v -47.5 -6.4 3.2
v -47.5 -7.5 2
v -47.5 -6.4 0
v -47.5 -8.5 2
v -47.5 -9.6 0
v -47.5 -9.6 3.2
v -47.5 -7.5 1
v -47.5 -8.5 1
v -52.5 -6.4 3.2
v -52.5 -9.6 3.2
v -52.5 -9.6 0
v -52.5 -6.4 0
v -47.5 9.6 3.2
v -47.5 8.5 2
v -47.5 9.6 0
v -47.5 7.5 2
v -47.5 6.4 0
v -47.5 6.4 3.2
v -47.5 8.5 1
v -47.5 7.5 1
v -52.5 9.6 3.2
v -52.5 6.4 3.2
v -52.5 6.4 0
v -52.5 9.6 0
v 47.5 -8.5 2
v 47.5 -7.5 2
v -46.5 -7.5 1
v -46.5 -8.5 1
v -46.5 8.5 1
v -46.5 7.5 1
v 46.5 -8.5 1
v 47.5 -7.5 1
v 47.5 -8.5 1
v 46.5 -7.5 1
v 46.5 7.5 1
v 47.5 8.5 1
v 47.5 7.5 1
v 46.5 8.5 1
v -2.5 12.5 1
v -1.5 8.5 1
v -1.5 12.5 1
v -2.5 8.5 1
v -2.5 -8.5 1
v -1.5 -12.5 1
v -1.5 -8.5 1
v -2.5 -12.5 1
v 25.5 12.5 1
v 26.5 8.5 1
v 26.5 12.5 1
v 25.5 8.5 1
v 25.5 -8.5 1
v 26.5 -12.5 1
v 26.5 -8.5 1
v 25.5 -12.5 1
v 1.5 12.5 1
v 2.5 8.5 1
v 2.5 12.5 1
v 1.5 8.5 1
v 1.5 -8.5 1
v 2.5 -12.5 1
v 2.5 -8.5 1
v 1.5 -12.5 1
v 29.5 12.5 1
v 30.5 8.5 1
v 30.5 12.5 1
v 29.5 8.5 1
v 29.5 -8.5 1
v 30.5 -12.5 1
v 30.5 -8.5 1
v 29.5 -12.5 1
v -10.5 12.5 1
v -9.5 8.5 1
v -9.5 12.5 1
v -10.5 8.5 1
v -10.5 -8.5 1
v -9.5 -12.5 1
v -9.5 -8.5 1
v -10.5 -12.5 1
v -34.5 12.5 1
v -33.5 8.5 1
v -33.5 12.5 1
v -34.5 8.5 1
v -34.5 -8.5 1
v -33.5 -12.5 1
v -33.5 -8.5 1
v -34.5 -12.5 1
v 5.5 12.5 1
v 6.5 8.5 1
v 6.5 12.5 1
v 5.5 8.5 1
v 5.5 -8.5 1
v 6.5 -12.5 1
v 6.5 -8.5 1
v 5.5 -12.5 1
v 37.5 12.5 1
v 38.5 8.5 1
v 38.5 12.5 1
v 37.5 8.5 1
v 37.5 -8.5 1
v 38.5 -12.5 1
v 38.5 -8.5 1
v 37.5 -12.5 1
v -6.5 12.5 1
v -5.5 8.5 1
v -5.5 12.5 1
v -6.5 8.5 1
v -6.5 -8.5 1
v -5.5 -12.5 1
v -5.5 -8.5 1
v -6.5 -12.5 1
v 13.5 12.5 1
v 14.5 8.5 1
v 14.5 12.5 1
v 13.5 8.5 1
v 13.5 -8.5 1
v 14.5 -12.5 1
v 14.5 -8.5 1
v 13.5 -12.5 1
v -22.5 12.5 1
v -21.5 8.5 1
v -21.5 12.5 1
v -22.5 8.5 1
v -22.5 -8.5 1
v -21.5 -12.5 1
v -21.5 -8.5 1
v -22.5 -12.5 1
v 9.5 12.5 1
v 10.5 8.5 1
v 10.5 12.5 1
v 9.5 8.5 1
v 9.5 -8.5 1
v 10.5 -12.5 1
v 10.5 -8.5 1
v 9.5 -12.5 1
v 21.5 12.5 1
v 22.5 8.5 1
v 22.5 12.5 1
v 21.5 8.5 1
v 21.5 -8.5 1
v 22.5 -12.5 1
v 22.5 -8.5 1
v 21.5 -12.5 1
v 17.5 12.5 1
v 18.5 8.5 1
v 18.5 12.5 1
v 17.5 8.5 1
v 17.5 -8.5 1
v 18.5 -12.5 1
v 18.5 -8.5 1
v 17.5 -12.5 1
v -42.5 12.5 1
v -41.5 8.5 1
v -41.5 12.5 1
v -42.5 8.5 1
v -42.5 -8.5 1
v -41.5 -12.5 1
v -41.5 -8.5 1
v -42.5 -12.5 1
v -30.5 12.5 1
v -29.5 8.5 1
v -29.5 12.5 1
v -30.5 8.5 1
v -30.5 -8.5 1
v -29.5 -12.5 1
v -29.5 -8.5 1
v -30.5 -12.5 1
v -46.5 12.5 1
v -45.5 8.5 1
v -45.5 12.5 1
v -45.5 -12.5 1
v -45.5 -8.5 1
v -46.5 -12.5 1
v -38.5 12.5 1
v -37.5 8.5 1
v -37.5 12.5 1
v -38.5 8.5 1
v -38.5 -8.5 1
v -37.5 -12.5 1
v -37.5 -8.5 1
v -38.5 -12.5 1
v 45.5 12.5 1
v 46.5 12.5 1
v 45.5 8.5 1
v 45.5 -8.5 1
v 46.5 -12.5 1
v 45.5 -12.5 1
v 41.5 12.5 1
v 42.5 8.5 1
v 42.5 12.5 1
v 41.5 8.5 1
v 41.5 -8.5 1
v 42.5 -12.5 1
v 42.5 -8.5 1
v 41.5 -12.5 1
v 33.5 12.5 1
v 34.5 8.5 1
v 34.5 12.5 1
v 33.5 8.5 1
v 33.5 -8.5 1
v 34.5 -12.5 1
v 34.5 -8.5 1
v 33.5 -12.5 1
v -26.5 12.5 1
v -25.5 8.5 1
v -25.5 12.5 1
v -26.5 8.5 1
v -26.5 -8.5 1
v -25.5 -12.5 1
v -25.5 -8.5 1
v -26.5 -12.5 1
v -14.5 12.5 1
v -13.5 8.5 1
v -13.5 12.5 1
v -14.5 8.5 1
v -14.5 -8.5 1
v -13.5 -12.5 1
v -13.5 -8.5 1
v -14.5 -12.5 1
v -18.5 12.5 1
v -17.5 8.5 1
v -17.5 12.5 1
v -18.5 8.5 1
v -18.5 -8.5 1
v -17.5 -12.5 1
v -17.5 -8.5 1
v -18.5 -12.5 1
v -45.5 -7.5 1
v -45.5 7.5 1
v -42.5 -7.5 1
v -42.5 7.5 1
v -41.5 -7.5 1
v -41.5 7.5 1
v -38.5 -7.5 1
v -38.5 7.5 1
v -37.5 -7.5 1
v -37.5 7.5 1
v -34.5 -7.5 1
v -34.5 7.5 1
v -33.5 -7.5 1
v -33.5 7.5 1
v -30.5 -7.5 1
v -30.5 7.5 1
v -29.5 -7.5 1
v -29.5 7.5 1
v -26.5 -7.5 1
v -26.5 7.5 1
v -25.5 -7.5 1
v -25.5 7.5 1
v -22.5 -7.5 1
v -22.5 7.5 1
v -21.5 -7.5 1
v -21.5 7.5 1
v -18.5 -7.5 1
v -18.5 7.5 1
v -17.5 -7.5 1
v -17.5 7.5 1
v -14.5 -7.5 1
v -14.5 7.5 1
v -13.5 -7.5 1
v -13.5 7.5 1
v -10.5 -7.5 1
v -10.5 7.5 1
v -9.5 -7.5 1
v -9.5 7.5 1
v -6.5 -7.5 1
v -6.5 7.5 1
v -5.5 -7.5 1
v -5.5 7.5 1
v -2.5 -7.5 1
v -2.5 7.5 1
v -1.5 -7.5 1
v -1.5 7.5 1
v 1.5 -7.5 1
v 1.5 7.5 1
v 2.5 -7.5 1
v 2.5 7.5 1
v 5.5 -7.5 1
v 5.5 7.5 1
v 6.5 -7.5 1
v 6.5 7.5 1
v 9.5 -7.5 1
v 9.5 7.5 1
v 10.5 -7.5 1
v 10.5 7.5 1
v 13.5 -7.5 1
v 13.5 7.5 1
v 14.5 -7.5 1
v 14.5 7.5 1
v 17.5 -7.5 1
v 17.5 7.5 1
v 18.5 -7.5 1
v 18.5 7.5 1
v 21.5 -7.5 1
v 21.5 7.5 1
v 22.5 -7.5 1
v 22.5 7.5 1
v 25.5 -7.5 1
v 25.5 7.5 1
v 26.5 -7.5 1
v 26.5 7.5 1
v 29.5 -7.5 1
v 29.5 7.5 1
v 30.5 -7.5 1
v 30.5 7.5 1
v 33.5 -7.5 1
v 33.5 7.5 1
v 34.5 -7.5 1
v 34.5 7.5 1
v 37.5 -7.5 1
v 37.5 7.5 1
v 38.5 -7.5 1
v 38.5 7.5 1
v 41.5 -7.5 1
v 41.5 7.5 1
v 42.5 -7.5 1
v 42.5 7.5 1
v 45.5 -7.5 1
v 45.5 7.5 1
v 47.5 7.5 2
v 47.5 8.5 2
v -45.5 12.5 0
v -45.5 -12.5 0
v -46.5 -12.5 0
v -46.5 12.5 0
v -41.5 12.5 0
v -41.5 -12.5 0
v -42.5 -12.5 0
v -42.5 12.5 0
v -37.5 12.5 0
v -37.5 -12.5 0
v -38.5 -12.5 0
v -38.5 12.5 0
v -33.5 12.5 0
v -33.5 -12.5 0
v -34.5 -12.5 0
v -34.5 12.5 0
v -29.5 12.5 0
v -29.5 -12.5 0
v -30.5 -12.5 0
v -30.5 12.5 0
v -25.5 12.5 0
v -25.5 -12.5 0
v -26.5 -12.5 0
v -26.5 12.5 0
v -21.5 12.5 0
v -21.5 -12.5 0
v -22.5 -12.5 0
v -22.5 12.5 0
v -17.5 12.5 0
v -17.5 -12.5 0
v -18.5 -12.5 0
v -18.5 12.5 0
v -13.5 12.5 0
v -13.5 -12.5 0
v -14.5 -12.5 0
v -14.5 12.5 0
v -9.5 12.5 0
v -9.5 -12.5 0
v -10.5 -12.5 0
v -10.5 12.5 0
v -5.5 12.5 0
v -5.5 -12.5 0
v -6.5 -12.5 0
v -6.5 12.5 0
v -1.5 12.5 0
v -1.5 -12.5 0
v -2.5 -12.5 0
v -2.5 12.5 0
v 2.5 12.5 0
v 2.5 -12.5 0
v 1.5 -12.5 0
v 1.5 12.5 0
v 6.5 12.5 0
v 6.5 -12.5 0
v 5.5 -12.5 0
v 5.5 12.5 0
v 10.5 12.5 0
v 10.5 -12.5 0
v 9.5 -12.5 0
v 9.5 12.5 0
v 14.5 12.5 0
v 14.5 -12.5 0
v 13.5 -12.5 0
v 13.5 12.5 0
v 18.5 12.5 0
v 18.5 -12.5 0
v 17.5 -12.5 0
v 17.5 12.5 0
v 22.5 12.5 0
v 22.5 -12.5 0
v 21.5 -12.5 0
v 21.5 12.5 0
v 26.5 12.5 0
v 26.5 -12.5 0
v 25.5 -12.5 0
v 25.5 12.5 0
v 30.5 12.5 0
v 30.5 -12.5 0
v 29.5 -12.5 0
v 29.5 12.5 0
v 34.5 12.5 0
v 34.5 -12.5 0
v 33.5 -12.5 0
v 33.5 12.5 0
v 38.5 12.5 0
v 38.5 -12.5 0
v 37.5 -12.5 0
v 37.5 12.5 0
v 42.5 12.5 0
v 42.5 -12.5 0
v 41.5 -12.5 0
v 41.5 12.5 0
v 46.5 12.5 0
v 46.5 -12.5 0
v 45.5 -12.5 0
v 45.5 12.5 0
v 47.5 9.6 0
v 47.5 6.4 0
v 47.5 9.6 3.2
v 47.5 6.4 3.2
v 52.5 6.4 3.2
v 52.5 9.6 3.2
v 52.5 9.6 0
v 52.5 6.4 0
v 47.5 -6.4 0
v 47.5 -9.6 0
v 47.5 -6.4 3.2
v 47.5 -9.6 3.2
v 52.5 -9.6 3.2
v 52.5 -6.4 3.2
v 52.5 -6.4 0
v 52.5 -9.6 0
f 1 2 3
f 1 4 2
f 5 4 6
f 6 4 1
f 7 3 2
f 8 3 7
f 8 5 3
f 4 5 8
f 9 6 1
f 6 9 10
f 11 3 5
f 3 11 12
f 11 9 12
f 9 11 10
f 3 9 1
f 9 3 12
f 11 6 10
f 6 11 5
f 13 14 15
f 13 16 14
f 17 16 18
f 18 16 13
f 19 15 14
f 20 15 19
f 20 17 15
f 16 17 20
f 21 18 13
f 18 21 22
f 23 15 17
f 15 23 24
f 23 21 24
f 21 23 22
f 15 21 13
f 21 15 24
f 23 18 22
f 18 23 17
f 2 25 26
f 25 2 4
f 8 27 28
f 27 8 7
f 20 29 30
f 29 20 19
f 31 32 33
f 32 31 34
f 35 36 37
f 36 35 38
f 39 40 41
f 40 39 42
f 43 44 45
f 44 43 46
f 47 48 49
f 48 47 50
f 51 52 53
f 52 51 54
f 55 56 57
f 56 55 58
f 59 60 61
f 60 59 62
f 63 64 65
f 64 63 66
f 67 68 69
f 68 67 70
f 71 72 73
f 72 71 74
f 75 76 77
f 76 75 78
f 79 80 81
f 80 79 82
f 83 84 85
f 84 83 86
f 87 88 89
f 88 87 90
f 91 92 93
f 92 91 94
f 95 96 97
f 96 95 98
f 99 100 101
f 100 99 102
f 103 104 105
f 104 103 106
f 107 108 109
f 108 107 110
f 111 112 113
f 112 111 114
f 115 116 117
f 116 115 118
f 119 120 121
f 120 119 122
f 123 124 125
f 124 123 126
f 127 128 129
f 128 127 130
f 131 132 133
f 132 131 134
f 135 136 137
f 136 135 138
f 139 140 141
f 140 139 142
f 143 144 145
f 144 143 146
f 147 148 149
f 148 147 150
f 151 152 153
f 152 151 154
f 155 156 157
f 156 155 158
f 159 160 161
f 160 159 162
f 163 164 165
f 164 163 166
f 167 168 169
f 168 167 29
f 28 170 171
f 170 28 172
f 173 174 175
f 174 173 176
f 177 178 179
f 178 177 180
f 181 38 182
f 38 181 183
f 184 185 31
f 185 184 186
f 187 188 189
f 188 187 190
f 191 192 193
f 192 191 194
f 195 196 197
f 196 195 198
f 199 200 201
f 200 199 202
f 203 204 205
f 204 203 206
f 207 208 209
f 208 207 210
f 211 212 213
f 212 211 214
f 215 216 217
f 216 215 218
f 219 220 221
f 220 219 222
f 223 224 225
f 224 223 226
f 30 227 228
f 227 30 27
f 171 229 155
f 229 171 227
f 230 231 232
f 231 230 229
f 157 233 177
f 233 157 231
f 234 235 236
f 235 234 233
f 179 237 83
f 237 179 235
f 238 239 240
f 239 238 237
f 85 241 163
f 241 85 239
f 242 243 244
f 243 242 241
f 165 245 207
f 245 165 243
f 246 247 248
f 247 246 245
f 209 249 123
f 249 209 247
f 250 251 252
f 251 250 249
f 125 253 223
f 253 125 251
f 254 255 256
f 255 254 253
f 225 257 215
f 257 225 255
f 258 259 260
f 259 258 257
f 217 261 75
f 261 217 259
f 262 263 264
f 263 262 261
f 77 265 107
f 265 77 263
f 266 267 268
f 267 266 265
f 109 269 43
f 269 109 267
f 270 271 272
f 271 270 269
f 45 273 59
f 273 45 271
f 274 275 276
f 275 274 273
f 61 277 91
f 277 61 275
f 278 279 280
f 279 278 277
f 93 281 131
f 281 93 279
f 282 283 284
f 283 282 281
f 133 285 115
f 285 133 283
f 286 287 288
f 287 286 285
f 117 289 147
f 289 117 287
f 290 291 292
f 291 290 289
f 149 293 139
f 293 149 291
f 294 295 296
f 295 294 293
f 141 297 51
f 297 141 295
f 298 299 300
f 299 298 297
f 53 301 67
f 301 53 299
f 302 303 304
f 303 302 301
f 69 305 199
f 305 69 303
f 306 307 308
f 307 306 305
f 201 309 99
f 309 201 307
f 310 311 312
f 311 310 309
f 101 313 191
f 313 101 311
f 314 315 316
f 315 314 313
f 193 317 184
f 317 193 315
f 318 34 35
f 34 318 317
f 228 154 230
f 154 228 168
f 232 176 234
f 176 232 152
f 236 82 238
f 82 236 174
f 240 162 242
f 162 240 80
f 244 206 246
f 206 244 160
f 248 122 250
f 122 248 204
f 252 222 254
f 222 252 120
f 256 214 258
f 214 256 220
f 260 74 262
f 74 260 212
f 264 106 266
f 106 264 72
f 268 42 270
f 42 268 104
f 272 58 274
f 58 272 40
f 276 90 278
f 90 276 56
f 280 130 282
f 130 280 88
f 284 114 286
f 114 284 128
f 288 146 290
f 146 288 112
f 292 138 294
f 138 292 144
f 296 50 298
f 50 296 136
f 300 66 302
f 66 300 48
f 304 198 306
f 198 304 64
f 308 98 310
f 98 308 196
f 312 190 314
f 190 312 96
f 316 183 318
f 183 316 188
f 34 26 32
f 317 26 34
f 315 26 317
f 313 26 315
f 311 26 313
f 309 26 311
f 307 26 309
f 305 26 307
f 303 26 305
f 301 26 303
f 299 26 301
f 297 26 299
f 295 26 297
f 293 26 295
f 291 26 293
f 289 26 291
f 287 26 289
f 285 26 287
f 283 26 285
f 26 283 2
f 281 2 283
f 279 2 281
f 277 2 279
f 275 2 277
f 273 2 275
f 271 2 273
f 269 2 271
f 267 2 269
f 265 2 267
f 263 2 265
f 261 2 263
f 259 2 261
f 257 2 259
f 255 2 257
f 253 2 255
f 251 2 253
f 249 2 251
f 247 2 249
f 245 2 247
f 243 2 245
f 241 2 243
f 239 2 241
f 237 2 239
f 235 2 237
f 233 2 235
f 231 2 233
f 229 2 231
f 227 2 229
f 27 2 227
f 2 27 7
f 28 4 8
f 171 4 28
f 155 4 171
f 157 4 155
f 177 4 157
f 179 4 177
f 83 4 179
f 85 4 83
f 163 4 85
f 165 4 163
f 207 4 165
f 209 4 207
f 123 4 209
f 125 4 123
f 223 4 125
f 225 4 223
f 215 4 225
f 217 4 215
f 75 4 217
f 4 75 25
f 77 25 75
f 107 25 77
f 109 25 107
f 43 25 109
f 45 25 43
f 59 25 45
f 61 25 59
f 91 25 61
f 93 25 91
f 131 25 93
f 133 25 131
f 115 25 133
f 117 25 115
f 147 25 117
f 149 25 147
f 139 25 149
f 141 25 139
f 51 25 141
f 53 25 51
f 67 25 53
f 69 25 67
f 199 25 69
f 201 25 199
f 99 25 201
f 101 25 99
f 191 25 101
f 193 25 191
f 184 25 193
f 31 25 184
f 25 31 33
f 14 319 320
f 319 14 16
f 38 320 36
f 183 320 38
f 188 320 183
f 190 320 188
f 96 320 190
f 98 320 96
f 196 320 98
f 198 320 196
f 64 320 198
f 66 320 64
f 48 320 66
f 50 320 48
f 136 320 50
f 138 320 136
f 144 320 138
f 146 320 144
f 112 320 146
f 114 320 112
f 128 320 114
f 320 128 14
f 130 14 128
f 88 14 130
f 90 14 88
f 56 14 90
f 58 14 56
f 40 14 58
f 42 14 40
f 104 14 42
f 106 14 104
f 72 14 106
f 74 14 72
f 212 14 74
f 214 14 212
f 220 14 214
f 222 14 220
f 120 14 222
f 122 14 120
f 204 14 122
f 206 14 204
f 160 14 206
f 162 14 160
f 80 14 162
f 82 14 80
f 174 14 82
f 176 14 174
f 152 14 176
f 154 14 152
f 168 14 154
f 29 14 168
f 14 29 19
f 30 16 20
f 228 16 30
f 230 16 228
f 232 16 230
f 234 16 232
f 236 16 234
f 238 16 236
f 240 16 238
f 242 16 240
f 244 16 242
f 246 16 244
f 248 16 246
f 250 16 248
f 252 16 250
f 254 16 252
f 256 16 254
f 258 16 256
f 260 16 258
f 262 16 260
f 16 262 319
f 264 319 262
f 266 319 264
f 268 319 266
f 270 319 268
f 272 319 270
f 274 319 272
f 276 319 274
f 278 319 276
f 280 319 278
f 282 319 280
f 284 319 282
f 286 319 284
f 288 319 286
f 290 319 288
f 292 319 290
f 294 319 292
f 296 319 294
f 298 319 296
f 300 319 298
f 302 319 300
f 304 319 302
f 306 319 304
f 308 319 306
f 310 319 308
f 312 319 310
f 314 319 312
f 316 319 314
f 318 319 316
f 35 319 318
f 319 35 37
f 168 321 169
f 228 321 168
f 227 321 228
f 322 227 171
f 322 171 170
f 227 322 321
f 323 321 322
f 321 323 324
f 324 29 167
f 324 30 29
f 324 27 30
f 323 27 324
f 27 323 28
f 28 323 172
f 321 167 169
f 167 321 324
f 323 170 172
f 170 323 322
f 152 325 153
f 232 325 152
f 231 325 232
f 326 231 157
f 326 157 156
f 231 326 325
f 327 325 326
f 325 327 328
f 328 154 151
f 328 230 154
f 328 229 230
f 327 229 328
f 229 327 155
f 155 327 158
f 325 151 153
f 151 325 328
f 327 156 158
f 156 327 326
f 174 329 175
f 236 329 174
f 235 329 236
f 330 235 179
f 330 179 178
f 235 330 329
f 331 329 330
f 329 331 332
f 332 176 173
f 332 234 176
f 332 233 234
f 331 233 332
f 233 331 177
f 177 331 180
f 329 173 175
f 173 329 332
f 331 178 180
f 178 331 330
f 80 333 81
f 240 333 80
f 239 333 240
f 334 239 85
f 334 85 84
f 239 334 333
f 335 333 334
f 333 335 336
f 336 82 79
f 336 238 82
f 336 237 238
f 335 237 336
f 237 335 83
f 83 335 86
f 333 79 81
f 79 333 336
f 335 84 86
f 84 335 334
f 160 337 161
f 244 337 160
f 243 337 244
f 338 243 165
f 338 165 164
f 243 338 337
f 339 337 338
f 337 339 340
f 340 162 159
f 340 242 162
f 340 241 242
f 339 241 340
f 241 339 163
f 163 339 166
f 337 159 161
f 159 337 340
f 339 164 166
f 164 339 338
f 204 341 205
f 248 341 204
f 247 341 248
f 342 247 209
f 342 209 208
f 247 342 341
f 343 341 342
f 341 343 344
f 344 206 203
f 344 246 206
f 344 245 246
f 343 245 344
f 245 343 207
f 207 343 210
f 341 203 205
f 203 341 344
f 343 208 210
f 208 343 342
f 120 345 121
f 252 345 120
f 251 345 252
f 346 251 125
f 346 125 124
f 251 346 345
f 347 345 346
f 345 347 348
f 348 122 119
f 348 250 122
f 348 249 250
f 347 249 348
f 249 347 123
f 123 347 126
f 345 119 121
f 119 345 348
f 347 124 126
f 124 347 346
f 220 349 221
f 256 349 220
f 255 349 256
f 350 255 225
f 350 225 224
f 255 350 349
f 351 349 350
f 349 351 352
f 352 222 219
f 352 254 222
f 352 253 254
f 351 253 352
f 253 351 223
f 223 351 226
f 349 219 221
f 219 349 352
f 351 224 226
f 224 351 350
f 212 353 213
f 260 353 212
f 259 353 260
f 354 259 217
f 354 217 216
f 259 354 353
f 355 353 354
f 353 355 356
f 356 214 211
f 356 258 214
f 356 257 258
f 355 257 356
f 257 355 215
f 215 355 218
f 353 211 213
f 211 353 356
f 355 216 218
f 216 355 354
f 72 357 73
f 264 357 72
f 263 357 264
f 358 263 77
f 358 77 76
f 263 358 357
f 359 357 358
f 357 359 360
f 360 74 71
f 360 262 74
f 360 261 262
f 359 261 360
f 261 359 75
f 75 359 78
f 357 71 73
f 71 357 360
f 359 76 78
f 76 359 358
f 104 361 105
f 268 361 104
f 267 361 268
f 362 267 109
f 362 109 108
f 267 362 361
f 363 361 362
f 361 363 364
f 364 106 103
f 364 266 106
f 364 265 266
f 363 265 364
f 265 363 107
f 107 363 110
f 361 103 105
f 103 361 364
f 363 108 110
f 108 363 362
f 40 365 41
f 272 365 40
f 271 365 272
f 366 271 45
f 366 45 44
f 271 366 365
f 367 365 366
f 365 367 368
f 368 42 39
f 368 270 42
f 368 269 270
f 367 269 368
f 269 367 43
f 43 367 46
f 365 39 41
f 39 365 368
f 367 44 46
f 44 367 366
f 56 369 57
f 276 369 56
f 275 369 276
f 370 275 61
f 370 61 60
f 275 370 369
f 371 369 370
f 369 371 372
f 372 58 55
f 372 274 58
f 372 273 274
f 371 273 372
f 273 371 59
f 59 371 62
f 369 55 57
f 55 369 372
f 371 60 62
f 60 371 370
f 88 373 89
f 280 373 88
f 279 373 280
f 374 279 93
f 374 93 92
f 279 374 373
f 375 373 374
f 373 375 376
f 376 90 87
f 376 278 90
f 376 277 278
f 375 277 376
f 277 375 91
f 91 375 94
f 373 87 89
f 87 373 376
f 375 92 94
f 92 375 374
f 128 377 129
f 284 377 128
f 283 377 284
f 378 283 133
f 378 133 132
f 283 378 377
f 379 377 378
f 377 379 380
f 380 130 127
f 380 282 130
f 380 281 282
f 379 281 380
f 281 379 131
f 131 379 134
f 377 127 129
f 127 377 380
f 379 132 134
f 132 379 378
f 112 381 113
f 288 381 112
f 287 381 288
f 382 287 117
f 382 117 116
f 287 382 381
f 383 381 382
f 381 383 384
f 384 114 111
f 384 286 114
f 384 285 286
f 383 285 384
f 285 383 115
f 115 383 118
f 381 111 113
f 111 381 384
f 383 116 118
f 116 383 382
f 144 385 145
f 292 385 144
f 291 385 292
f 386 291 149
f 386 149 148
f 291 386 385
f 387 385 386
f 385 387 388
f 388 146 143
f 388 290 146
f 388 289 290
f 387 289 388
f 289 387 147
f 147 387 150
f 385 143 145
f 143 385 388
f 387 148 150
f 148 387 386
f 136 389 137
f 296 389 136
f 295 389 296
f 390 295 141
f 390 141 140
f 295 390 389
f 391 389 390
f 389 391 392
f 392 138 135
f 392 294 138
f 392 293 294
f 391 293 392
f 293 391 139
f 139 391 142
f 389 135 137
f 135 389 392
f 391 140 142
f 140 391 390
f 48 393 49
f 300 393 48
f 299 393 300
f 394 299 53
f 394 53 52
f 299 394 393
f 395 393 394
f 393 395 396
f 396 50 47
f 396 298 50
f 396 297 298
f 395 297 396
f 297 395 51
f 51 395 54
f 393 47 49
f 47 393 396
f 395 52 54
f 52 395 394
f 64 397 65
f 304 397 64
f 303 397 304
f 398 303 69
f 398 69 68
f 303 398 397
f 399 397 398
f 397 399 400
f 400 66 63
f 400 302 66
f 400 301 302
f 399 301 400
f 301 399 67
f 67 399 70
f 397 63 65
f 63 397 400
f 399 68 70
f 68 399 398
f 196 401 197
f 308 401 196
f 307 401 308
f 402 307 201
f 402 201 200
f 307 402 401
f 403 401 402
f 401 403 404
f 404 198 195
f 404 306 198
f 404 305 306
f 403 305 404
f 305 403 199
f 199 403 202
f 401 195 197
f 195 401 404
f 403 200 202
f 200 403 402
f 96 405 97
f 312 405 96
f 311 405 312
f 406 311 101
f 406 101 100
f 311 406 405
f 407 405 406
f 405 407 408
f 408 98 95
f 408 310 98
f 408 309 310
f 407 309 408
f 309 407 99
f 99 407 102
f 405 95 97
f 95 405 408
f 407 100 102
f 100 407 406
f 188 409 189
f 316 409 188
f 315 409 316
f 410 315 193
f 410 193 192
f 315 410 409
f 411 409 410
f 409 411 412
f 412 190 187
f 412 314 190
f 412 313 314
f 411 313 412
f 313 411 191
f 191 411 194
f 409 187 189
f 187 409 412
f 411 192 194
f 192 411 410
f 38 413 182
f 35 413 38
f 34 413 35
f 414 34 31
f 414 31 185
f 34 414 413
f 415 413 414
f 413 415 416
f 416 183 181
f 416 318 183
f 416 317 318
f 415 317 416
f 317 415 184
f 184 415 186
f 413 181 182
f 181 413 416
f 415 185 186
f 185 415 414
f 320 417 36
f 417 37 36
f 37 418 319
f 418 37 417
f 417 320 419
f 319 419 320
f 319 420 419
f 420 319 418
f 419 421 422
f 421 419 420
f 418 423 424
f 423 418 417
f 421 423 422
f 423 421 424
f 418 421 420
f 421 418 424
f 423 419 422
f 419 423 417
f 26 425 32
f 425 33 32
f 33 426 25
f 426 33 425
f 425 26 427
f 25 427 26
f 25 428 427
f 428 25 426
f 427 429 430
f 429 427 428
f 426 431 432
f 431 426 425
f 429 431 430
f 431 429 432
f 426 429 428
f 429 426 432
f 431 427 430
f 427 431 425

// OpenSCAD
MOUNT_WIDTH = 3.2;
MOUNT_DEPTH = 5;
MOUNT_SPACING = 16;

BAR_WIDTH = 1;
BAR_LENGTH = 25;
BAR_SPACING = 4;

CROSSBAR_WIDTH = 1;
CROSSBAR_LENGTH = BAR_SPACING * 25;

SINE = false;
SINE_LENGTH = 10;
PI = 3.14158692;

module mounts() {
    for(i = [-1, 1]) {
        translate([0, i * MOUNT_SPACING/2, MOUNT_WIDTH/2])
        cube(size = [MOUNT_DEPTH, MOUNT_WIDTH, MOUNT_WIDTH], center = true);
    }
}

module crossbars() {
    for(i = [-1, 1]) {
        translate([0, i * MOUNT_SPACING/2, CROSSBAR_WIDTH/2 + BAR_WIDTH])
        cube(size = [CROSSBAR_LENGTH, CROSSBAR_WIDTH, CROSSBAR_WIDTH], center = true);
    }
}

module bars() {
    for(i = [0:((CROSSBAR_LENGTH -  2 * BAR_SPACING)/BAR_SPACING)]) {
        l = SINE ? sin(180 * (i * BAR_SPACING)/(CROSSBAR_LENGTH - 2 * BAR_SPACING)) * SINE_LENGTH : 0;
        translate([(i + 1) * BAR_SPACING - CROSSBAR_LENGTH/2, l/2, BAR_WIDTH/2])
        cube(size = [BAR_WIDTH, BAR_LENGTH + l, BAR_WIDTH], center = true);
    }
}

union() {
    translate([-CROSSBAR_LENGTH/2, 0, 0])
    mounts();
    
    crossbars();

    bars();

    translate([CROSSBAR_LENGTH/2, 0, 0])
    rotate([0, 0, 180])
    mounts();
}
